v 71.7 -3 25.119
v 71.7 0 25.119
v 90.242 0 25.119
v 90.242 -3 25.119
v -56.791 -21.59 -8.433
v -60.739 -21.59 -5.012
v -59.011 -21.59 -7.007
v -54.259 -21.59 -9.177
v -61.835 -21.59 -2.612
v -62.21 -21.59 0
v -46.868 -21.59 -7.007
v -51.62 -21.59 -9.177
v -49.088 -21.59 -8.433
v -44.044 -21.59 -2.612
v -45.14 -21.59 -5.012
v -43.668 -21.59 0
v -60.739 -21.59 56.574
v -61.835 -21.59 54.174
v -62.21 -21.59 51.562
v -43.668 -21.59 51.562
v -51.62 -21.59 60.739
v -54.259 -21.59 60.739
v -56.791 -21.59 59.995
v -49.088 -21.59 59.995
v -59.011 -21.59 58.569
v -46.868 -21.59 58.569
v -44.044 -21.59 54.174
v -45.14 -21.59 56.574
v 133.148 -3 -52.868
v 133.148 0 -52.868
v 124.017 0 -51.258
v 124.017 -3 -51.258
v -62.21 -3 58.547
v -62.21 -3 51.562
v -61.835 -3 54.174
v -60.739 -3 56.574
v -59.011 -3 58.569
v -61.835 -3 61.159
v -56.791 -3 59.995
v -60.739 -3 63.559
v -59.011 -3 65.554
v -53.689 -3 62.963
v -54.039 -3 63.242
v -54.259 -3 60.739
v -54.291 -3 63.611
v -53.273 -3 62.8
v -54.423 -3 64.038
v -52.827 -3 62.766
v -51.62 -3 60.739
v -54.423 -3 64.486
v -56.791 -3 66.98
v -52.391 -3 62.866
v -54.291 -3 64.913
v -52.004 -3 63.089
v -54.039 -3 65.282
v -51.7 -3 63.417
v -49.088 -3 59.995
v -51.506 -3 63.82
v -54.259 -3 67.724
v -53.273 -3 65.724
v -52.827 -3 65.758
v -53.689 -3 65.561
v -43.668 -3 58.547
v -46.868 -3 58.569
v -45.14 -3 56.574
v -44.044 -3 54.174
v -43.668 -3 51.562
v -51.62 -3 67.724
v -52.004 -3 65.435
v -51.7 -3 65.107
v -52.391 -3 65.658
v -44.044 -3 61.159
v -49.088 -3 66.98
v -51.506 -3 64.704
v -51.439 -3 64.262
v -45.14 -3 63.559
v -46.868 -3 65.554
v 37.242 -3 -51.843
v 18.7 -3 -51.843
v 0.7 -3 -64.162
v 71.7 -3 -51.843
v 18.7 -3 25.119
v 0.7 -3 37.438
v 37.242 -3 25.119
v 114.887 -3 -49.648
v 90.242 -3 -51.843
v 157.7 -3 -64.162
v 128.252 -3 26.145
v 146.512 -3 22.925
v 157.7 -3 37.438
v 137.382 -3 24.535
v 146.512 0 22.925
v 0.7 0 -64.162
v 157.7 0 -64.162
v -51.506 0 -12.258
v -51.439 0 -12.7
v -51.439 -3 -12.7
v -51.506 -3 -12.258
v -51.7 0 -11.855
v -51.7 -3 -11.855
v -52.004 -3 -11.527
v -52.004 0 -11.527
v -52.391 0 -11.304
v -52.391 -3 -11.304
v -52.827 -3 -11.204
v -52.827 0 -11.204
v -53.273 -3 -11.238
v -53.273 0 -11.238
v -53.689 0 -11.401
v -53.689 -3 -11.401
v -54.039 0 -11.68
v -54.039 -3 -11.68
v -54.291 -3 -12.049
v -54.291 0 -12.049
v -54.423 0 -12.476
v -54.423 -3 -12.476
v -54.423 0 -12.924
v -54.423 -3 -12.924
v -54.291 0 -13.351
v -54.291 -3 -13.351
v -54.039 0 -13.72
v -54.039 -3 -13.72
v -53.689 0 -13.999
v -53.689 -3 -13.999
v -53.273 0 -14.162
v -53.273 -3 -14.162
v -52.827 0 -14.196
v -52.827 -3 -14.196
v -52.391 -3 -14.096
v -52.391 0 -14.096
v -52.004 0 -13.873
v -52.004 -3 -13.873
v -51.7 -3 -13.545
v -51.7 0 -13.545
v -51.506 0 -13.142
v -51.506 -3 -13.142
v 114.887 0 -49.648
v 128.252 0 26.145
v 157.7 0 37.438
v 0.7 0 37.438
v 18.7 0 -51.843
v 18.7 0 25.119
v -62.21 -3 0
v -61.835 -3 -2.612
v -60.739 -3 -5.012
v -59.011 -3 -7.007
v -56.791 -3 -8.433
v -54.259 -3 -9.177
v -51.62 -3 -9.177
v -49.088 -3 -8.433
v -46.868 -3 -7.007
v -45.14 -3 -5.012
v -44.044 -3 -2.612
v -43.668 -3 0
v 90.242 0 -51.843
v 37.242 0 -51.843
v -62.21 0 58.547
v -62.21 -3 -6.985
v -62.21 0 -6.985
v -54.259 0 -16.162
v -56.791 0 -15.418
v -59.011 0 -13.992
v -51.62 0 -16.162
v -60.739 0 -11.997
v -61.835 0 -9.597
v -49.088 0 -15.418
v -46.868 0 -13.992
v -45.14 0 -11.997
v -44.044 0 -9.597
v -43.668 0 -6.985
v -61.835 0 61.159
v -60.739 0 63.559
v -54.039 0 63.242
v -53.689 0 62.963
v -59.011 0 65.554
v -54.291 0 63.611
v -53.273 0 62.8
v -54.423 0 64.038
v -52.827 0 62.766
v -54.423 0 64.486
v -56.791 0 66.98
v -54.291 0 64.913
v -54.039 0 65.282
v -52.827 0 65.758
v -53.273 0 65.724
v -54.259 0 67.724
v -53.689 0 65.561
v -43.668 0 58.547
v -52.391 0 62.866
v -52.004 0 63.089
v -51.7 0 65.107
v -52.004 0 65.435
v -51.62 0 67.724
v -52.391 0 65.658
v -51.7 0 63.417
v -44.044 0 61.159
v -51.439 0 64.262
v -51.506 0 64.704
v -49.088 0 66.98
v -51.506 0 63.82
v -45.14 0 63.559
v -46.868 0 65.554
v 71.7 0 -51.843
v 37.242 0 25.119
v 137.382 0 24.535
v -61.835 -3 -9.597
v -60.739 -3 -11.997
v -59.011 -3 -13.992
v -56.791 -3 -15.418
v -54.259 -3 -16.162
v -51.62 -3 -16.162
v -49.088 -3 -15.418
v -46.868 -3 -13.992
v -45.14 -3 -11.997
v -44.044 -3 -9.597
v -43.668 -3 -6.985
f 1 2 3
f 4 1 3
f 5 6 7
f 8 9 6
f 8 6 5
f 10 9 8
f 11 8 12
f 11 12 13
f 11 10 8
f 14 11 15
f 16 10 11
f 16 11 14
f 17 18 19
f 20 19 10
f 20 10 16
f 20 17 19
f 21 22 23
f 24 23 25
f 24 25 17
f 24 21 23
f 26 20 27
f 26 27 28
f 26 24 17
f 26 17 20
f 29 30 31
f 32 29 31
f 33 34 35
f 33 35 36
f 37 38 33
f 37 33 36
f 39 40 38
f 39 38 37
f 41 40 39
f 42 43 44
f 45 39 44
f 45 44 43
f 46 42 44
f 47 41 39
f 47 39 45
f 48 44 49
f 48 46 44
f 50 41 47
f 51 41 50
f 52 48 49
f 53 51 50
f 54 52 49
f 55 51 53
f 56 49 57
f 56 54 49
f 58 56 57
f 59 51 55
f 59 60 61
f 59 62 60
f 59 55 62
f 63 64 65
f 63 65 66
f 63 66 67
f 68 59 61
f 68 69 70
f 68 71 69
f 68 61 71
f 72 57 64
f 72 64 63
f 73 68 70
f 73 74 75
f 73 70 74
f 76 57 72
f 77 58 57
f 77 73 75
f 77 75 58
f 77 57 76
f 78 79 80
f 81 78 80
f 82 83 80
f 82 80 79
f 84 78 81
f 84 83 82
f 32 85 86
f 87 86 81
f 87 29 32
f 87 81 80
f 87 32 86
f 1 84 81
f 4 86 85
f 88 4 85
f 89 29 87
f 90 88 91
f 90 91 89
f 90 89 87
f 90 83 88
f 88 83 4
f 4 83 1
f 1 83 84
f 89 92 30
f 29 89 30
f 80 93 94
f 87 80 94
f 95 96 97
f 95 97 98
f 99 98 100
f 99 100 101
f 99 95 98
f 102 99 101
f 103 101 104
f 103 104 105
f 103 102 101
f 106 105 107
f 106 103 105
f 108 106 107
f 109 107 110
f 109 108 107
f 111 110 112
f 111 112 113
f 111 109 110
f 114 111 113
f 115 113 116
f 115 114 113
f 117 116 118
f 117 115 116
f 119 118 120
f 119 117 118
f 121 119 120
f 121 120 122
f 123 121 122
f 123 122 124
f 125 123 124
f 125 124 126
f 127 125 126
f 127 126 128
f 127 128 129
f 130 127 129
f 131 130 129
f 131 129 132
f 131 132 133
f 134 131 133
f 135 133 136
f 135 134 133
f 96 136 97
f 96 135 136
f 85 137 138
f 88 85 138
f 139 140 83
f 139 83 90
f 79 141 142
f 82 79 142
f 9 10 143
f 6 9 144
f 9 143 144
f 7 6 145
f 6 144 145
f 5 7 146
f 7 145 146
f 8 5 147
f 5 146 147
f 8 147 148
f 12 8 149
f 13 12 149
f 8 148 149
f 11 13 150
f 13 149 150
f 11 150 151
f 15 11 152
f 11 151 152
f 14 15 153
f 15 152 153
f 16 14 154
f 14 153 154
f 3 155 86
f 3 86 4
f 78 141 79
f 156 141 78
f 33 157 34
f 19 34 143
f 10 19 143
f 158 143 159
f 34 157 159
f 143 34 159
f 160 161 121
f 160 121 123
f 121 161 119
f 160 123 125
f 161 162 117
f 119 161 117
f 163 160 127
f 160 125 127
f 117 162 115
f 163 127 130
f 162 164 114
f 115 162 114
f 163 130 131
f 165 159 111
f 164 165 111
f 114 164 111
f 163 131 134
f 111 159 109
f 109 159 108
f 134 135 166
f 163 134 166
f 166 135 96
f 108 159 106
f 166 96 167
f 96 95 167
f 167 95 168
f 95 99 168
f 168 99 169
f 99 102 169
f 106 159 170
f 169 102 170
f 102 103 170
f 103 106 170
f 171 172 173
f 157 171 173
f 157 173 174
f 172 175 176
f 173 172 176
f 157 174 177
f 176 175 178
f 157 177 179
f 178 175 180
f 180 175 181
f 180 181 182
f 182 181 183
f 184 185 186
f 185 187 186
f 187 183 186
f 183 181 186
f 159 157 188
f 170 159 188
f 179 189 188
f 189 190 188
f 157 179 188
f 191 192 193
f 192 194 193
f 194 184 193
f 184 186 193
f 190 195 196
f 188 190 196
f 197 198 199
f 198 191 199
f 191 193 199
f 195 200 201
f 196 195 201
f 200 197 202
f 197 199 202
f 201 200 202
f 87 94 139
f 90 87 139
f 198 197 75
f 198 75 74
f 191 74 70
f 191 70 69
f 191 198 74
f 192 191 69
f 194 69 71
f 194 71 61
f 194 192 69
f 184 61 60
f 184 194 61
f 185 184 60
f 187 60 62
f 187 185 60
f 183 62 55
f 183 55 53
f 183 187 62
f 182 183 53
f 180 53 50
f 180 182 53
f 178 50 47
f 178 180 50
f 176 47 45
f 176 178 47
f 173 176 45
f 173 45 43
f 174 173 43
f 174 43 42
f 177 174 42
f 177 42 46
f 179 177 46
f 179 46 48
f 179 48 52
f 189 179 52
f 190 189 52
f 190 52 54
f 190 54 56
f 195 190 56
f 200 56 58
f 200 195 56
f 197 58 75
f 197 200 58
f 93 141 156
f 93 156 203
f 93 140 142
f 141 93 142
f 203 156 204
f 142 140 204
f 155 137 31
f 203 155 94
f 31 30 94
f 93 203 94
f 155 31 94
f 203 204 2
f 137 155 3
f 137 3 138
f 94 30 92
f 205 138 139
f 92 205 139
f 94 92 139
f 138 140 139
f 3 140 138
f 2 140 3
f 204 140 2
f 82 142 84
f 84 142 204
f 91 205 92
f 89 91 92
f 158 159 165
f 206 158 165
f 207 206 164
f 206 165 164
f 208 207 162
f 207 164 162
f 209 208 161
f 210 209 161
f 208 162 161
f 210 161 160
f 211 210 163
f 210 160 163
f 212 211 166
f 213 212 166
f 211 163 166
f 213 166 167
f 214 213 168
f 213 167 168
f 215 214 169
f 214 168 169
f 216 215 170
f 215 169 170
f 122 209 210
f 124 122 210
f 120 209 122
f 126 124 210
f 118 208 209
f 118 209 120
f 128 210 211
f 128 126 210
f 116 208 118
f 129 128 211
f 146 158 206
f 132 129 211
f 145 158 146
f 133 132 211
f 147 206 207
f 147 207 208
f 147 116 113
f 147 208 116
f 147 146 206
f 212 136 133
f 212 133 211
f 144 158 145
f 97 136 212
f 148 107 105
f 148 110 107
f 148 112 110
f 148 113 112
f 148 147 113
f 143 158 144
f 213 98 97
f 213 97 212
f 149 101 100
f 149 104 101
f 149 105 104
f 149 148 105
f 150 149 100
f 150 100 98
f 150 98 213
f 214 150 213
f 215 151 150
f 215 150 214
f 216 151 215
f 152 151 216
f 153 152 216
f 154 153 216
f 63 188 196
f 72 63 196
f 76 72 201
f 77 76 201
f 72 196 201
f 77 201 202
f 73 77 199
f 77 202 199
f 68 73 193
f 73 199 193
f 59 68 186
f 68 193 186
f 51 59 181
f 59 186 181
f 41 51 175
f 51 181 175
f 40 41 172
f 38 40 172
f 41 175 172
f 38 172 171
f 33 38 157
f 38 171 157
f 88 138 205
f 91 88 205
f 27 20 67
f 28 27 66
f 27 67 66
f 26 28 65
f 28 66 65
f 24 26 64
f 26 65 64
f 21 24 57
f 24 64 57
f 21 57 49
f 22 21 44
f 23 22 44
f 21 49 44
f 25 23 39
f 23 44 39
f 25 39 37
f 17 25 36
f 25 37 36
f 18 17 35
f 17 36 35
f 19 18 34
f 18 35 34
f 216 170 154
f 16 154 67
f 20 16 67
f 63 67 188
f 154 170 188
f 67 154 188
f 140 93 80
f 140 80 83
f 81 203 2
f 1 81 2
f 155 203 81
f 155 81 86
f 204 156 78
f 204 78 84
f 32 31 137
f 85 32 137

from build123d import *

# Parameters (mm, degrees)
F2_DEPTH = 21.59
F0_R     = 1.5
F3_DEPTH = 3
F1_W     = 157
F1_H     = 101.6
F1_W_2   = 18.542
F1_H_2   = 76.962
F4_DEPTH = 3


with BuildPart() as f2:
    # F0 (on Front) → F2 (new body)
    with BuildSketch(Plane.XZ):
        with BuildLine():
            Line((-43.668363, 0), (-43.668363, 51.562))
            ThreePointArc((-43.668363, 51.562), (-52.939363, 60.833), (-62.210363, 51.562))
            Line((-62.210363, 51.562), (-62.210363, 0))
            ThreePointArc((-62.210363, 0), (-52.939363, -9.271), (-43.668363, 0))
        make_face()
    extrude(amount=F2_DEPTH)

    # F0 (on Front) → F3 (join)
    with BuildSketch(Plane.XZ):
        with BuildLine():
            Line((-43.668363, 0), (-43.668363, 51.562))
            ThreePointArc((-43.668363, 51.562), (-52.939363, 60.833), (-62.210363, 51.562))
            Line((-62.210363, 51.562), (-62.210363, 0))
            ThreePointArc((-62.210363, 0), (-52.939363, -9.271), (-43.668363, 0))
        make_face()
        with BuildLine():
            ThreePointArc((-62.210363, 51.562), (-52.939363, 60.833), (-43.668363, 51.562))
            Line((-43.668363, 51.562), (-43.668363, 58.547))
            ThreePointArc((-43.668363, 58.547), (-52.939363, 67.818), (-62.210363, 58.547))
            Line((-62.210363, 58.547), (-62.210363, 51.562))
        make_face()
        with Locations((-52.939363, 64.262)):
            Circle(F0_R, mode=Mode.SUBTRACT)
        with BuildLine():
            Line((-43.668363, -6.985), (-43.668363, 0))
            ThreePointArc((-43.668363, 0), (-52.939363, -9.271), (-62.210363, 0))
            Line((-62.210363, 0), (-62.210363, -6.985))
            ThreePointArc((-62.210363, -6.985), (-52.939363, -16.256), (-43.668363, -6.985))
        make_face()
        with Locations((-52.939363, -12.7)):
            Circle(F0_R, mode=Mode.SUBTRACT)
    extrude(amount=F3_DEPTH)


with BuildPart() as f4:
    # F1 (on Front) → F4 (new body)
    with BuildSketch(Plane.XZ):
        with Locations((79.19958, -13.361576)):
            Rectangle(F1_W, F1_H)
        with Locations((27.97058, -13.361576)):
            Rectangle(F1_W_2, F1_H_2, mode=Mode.SUBTRACT)
        with Locations((80.97058, -13.361576)):
            Rectangle(F1_W_2, F1_H_2, mode=Mode.SUBTRACT)
        Polygon((114.887272, -49.648071), (128.251583, 26.144704), (137.381736, 24.534811), (146.511888, 22.924919), (133.147577, -52.867855), (124.017425, -51.257963), align=None, mode=Mode.SUBTRACT)
    extrude(amount=F4_DEPTH)


solid = Compound([f2.part, f4.part])
